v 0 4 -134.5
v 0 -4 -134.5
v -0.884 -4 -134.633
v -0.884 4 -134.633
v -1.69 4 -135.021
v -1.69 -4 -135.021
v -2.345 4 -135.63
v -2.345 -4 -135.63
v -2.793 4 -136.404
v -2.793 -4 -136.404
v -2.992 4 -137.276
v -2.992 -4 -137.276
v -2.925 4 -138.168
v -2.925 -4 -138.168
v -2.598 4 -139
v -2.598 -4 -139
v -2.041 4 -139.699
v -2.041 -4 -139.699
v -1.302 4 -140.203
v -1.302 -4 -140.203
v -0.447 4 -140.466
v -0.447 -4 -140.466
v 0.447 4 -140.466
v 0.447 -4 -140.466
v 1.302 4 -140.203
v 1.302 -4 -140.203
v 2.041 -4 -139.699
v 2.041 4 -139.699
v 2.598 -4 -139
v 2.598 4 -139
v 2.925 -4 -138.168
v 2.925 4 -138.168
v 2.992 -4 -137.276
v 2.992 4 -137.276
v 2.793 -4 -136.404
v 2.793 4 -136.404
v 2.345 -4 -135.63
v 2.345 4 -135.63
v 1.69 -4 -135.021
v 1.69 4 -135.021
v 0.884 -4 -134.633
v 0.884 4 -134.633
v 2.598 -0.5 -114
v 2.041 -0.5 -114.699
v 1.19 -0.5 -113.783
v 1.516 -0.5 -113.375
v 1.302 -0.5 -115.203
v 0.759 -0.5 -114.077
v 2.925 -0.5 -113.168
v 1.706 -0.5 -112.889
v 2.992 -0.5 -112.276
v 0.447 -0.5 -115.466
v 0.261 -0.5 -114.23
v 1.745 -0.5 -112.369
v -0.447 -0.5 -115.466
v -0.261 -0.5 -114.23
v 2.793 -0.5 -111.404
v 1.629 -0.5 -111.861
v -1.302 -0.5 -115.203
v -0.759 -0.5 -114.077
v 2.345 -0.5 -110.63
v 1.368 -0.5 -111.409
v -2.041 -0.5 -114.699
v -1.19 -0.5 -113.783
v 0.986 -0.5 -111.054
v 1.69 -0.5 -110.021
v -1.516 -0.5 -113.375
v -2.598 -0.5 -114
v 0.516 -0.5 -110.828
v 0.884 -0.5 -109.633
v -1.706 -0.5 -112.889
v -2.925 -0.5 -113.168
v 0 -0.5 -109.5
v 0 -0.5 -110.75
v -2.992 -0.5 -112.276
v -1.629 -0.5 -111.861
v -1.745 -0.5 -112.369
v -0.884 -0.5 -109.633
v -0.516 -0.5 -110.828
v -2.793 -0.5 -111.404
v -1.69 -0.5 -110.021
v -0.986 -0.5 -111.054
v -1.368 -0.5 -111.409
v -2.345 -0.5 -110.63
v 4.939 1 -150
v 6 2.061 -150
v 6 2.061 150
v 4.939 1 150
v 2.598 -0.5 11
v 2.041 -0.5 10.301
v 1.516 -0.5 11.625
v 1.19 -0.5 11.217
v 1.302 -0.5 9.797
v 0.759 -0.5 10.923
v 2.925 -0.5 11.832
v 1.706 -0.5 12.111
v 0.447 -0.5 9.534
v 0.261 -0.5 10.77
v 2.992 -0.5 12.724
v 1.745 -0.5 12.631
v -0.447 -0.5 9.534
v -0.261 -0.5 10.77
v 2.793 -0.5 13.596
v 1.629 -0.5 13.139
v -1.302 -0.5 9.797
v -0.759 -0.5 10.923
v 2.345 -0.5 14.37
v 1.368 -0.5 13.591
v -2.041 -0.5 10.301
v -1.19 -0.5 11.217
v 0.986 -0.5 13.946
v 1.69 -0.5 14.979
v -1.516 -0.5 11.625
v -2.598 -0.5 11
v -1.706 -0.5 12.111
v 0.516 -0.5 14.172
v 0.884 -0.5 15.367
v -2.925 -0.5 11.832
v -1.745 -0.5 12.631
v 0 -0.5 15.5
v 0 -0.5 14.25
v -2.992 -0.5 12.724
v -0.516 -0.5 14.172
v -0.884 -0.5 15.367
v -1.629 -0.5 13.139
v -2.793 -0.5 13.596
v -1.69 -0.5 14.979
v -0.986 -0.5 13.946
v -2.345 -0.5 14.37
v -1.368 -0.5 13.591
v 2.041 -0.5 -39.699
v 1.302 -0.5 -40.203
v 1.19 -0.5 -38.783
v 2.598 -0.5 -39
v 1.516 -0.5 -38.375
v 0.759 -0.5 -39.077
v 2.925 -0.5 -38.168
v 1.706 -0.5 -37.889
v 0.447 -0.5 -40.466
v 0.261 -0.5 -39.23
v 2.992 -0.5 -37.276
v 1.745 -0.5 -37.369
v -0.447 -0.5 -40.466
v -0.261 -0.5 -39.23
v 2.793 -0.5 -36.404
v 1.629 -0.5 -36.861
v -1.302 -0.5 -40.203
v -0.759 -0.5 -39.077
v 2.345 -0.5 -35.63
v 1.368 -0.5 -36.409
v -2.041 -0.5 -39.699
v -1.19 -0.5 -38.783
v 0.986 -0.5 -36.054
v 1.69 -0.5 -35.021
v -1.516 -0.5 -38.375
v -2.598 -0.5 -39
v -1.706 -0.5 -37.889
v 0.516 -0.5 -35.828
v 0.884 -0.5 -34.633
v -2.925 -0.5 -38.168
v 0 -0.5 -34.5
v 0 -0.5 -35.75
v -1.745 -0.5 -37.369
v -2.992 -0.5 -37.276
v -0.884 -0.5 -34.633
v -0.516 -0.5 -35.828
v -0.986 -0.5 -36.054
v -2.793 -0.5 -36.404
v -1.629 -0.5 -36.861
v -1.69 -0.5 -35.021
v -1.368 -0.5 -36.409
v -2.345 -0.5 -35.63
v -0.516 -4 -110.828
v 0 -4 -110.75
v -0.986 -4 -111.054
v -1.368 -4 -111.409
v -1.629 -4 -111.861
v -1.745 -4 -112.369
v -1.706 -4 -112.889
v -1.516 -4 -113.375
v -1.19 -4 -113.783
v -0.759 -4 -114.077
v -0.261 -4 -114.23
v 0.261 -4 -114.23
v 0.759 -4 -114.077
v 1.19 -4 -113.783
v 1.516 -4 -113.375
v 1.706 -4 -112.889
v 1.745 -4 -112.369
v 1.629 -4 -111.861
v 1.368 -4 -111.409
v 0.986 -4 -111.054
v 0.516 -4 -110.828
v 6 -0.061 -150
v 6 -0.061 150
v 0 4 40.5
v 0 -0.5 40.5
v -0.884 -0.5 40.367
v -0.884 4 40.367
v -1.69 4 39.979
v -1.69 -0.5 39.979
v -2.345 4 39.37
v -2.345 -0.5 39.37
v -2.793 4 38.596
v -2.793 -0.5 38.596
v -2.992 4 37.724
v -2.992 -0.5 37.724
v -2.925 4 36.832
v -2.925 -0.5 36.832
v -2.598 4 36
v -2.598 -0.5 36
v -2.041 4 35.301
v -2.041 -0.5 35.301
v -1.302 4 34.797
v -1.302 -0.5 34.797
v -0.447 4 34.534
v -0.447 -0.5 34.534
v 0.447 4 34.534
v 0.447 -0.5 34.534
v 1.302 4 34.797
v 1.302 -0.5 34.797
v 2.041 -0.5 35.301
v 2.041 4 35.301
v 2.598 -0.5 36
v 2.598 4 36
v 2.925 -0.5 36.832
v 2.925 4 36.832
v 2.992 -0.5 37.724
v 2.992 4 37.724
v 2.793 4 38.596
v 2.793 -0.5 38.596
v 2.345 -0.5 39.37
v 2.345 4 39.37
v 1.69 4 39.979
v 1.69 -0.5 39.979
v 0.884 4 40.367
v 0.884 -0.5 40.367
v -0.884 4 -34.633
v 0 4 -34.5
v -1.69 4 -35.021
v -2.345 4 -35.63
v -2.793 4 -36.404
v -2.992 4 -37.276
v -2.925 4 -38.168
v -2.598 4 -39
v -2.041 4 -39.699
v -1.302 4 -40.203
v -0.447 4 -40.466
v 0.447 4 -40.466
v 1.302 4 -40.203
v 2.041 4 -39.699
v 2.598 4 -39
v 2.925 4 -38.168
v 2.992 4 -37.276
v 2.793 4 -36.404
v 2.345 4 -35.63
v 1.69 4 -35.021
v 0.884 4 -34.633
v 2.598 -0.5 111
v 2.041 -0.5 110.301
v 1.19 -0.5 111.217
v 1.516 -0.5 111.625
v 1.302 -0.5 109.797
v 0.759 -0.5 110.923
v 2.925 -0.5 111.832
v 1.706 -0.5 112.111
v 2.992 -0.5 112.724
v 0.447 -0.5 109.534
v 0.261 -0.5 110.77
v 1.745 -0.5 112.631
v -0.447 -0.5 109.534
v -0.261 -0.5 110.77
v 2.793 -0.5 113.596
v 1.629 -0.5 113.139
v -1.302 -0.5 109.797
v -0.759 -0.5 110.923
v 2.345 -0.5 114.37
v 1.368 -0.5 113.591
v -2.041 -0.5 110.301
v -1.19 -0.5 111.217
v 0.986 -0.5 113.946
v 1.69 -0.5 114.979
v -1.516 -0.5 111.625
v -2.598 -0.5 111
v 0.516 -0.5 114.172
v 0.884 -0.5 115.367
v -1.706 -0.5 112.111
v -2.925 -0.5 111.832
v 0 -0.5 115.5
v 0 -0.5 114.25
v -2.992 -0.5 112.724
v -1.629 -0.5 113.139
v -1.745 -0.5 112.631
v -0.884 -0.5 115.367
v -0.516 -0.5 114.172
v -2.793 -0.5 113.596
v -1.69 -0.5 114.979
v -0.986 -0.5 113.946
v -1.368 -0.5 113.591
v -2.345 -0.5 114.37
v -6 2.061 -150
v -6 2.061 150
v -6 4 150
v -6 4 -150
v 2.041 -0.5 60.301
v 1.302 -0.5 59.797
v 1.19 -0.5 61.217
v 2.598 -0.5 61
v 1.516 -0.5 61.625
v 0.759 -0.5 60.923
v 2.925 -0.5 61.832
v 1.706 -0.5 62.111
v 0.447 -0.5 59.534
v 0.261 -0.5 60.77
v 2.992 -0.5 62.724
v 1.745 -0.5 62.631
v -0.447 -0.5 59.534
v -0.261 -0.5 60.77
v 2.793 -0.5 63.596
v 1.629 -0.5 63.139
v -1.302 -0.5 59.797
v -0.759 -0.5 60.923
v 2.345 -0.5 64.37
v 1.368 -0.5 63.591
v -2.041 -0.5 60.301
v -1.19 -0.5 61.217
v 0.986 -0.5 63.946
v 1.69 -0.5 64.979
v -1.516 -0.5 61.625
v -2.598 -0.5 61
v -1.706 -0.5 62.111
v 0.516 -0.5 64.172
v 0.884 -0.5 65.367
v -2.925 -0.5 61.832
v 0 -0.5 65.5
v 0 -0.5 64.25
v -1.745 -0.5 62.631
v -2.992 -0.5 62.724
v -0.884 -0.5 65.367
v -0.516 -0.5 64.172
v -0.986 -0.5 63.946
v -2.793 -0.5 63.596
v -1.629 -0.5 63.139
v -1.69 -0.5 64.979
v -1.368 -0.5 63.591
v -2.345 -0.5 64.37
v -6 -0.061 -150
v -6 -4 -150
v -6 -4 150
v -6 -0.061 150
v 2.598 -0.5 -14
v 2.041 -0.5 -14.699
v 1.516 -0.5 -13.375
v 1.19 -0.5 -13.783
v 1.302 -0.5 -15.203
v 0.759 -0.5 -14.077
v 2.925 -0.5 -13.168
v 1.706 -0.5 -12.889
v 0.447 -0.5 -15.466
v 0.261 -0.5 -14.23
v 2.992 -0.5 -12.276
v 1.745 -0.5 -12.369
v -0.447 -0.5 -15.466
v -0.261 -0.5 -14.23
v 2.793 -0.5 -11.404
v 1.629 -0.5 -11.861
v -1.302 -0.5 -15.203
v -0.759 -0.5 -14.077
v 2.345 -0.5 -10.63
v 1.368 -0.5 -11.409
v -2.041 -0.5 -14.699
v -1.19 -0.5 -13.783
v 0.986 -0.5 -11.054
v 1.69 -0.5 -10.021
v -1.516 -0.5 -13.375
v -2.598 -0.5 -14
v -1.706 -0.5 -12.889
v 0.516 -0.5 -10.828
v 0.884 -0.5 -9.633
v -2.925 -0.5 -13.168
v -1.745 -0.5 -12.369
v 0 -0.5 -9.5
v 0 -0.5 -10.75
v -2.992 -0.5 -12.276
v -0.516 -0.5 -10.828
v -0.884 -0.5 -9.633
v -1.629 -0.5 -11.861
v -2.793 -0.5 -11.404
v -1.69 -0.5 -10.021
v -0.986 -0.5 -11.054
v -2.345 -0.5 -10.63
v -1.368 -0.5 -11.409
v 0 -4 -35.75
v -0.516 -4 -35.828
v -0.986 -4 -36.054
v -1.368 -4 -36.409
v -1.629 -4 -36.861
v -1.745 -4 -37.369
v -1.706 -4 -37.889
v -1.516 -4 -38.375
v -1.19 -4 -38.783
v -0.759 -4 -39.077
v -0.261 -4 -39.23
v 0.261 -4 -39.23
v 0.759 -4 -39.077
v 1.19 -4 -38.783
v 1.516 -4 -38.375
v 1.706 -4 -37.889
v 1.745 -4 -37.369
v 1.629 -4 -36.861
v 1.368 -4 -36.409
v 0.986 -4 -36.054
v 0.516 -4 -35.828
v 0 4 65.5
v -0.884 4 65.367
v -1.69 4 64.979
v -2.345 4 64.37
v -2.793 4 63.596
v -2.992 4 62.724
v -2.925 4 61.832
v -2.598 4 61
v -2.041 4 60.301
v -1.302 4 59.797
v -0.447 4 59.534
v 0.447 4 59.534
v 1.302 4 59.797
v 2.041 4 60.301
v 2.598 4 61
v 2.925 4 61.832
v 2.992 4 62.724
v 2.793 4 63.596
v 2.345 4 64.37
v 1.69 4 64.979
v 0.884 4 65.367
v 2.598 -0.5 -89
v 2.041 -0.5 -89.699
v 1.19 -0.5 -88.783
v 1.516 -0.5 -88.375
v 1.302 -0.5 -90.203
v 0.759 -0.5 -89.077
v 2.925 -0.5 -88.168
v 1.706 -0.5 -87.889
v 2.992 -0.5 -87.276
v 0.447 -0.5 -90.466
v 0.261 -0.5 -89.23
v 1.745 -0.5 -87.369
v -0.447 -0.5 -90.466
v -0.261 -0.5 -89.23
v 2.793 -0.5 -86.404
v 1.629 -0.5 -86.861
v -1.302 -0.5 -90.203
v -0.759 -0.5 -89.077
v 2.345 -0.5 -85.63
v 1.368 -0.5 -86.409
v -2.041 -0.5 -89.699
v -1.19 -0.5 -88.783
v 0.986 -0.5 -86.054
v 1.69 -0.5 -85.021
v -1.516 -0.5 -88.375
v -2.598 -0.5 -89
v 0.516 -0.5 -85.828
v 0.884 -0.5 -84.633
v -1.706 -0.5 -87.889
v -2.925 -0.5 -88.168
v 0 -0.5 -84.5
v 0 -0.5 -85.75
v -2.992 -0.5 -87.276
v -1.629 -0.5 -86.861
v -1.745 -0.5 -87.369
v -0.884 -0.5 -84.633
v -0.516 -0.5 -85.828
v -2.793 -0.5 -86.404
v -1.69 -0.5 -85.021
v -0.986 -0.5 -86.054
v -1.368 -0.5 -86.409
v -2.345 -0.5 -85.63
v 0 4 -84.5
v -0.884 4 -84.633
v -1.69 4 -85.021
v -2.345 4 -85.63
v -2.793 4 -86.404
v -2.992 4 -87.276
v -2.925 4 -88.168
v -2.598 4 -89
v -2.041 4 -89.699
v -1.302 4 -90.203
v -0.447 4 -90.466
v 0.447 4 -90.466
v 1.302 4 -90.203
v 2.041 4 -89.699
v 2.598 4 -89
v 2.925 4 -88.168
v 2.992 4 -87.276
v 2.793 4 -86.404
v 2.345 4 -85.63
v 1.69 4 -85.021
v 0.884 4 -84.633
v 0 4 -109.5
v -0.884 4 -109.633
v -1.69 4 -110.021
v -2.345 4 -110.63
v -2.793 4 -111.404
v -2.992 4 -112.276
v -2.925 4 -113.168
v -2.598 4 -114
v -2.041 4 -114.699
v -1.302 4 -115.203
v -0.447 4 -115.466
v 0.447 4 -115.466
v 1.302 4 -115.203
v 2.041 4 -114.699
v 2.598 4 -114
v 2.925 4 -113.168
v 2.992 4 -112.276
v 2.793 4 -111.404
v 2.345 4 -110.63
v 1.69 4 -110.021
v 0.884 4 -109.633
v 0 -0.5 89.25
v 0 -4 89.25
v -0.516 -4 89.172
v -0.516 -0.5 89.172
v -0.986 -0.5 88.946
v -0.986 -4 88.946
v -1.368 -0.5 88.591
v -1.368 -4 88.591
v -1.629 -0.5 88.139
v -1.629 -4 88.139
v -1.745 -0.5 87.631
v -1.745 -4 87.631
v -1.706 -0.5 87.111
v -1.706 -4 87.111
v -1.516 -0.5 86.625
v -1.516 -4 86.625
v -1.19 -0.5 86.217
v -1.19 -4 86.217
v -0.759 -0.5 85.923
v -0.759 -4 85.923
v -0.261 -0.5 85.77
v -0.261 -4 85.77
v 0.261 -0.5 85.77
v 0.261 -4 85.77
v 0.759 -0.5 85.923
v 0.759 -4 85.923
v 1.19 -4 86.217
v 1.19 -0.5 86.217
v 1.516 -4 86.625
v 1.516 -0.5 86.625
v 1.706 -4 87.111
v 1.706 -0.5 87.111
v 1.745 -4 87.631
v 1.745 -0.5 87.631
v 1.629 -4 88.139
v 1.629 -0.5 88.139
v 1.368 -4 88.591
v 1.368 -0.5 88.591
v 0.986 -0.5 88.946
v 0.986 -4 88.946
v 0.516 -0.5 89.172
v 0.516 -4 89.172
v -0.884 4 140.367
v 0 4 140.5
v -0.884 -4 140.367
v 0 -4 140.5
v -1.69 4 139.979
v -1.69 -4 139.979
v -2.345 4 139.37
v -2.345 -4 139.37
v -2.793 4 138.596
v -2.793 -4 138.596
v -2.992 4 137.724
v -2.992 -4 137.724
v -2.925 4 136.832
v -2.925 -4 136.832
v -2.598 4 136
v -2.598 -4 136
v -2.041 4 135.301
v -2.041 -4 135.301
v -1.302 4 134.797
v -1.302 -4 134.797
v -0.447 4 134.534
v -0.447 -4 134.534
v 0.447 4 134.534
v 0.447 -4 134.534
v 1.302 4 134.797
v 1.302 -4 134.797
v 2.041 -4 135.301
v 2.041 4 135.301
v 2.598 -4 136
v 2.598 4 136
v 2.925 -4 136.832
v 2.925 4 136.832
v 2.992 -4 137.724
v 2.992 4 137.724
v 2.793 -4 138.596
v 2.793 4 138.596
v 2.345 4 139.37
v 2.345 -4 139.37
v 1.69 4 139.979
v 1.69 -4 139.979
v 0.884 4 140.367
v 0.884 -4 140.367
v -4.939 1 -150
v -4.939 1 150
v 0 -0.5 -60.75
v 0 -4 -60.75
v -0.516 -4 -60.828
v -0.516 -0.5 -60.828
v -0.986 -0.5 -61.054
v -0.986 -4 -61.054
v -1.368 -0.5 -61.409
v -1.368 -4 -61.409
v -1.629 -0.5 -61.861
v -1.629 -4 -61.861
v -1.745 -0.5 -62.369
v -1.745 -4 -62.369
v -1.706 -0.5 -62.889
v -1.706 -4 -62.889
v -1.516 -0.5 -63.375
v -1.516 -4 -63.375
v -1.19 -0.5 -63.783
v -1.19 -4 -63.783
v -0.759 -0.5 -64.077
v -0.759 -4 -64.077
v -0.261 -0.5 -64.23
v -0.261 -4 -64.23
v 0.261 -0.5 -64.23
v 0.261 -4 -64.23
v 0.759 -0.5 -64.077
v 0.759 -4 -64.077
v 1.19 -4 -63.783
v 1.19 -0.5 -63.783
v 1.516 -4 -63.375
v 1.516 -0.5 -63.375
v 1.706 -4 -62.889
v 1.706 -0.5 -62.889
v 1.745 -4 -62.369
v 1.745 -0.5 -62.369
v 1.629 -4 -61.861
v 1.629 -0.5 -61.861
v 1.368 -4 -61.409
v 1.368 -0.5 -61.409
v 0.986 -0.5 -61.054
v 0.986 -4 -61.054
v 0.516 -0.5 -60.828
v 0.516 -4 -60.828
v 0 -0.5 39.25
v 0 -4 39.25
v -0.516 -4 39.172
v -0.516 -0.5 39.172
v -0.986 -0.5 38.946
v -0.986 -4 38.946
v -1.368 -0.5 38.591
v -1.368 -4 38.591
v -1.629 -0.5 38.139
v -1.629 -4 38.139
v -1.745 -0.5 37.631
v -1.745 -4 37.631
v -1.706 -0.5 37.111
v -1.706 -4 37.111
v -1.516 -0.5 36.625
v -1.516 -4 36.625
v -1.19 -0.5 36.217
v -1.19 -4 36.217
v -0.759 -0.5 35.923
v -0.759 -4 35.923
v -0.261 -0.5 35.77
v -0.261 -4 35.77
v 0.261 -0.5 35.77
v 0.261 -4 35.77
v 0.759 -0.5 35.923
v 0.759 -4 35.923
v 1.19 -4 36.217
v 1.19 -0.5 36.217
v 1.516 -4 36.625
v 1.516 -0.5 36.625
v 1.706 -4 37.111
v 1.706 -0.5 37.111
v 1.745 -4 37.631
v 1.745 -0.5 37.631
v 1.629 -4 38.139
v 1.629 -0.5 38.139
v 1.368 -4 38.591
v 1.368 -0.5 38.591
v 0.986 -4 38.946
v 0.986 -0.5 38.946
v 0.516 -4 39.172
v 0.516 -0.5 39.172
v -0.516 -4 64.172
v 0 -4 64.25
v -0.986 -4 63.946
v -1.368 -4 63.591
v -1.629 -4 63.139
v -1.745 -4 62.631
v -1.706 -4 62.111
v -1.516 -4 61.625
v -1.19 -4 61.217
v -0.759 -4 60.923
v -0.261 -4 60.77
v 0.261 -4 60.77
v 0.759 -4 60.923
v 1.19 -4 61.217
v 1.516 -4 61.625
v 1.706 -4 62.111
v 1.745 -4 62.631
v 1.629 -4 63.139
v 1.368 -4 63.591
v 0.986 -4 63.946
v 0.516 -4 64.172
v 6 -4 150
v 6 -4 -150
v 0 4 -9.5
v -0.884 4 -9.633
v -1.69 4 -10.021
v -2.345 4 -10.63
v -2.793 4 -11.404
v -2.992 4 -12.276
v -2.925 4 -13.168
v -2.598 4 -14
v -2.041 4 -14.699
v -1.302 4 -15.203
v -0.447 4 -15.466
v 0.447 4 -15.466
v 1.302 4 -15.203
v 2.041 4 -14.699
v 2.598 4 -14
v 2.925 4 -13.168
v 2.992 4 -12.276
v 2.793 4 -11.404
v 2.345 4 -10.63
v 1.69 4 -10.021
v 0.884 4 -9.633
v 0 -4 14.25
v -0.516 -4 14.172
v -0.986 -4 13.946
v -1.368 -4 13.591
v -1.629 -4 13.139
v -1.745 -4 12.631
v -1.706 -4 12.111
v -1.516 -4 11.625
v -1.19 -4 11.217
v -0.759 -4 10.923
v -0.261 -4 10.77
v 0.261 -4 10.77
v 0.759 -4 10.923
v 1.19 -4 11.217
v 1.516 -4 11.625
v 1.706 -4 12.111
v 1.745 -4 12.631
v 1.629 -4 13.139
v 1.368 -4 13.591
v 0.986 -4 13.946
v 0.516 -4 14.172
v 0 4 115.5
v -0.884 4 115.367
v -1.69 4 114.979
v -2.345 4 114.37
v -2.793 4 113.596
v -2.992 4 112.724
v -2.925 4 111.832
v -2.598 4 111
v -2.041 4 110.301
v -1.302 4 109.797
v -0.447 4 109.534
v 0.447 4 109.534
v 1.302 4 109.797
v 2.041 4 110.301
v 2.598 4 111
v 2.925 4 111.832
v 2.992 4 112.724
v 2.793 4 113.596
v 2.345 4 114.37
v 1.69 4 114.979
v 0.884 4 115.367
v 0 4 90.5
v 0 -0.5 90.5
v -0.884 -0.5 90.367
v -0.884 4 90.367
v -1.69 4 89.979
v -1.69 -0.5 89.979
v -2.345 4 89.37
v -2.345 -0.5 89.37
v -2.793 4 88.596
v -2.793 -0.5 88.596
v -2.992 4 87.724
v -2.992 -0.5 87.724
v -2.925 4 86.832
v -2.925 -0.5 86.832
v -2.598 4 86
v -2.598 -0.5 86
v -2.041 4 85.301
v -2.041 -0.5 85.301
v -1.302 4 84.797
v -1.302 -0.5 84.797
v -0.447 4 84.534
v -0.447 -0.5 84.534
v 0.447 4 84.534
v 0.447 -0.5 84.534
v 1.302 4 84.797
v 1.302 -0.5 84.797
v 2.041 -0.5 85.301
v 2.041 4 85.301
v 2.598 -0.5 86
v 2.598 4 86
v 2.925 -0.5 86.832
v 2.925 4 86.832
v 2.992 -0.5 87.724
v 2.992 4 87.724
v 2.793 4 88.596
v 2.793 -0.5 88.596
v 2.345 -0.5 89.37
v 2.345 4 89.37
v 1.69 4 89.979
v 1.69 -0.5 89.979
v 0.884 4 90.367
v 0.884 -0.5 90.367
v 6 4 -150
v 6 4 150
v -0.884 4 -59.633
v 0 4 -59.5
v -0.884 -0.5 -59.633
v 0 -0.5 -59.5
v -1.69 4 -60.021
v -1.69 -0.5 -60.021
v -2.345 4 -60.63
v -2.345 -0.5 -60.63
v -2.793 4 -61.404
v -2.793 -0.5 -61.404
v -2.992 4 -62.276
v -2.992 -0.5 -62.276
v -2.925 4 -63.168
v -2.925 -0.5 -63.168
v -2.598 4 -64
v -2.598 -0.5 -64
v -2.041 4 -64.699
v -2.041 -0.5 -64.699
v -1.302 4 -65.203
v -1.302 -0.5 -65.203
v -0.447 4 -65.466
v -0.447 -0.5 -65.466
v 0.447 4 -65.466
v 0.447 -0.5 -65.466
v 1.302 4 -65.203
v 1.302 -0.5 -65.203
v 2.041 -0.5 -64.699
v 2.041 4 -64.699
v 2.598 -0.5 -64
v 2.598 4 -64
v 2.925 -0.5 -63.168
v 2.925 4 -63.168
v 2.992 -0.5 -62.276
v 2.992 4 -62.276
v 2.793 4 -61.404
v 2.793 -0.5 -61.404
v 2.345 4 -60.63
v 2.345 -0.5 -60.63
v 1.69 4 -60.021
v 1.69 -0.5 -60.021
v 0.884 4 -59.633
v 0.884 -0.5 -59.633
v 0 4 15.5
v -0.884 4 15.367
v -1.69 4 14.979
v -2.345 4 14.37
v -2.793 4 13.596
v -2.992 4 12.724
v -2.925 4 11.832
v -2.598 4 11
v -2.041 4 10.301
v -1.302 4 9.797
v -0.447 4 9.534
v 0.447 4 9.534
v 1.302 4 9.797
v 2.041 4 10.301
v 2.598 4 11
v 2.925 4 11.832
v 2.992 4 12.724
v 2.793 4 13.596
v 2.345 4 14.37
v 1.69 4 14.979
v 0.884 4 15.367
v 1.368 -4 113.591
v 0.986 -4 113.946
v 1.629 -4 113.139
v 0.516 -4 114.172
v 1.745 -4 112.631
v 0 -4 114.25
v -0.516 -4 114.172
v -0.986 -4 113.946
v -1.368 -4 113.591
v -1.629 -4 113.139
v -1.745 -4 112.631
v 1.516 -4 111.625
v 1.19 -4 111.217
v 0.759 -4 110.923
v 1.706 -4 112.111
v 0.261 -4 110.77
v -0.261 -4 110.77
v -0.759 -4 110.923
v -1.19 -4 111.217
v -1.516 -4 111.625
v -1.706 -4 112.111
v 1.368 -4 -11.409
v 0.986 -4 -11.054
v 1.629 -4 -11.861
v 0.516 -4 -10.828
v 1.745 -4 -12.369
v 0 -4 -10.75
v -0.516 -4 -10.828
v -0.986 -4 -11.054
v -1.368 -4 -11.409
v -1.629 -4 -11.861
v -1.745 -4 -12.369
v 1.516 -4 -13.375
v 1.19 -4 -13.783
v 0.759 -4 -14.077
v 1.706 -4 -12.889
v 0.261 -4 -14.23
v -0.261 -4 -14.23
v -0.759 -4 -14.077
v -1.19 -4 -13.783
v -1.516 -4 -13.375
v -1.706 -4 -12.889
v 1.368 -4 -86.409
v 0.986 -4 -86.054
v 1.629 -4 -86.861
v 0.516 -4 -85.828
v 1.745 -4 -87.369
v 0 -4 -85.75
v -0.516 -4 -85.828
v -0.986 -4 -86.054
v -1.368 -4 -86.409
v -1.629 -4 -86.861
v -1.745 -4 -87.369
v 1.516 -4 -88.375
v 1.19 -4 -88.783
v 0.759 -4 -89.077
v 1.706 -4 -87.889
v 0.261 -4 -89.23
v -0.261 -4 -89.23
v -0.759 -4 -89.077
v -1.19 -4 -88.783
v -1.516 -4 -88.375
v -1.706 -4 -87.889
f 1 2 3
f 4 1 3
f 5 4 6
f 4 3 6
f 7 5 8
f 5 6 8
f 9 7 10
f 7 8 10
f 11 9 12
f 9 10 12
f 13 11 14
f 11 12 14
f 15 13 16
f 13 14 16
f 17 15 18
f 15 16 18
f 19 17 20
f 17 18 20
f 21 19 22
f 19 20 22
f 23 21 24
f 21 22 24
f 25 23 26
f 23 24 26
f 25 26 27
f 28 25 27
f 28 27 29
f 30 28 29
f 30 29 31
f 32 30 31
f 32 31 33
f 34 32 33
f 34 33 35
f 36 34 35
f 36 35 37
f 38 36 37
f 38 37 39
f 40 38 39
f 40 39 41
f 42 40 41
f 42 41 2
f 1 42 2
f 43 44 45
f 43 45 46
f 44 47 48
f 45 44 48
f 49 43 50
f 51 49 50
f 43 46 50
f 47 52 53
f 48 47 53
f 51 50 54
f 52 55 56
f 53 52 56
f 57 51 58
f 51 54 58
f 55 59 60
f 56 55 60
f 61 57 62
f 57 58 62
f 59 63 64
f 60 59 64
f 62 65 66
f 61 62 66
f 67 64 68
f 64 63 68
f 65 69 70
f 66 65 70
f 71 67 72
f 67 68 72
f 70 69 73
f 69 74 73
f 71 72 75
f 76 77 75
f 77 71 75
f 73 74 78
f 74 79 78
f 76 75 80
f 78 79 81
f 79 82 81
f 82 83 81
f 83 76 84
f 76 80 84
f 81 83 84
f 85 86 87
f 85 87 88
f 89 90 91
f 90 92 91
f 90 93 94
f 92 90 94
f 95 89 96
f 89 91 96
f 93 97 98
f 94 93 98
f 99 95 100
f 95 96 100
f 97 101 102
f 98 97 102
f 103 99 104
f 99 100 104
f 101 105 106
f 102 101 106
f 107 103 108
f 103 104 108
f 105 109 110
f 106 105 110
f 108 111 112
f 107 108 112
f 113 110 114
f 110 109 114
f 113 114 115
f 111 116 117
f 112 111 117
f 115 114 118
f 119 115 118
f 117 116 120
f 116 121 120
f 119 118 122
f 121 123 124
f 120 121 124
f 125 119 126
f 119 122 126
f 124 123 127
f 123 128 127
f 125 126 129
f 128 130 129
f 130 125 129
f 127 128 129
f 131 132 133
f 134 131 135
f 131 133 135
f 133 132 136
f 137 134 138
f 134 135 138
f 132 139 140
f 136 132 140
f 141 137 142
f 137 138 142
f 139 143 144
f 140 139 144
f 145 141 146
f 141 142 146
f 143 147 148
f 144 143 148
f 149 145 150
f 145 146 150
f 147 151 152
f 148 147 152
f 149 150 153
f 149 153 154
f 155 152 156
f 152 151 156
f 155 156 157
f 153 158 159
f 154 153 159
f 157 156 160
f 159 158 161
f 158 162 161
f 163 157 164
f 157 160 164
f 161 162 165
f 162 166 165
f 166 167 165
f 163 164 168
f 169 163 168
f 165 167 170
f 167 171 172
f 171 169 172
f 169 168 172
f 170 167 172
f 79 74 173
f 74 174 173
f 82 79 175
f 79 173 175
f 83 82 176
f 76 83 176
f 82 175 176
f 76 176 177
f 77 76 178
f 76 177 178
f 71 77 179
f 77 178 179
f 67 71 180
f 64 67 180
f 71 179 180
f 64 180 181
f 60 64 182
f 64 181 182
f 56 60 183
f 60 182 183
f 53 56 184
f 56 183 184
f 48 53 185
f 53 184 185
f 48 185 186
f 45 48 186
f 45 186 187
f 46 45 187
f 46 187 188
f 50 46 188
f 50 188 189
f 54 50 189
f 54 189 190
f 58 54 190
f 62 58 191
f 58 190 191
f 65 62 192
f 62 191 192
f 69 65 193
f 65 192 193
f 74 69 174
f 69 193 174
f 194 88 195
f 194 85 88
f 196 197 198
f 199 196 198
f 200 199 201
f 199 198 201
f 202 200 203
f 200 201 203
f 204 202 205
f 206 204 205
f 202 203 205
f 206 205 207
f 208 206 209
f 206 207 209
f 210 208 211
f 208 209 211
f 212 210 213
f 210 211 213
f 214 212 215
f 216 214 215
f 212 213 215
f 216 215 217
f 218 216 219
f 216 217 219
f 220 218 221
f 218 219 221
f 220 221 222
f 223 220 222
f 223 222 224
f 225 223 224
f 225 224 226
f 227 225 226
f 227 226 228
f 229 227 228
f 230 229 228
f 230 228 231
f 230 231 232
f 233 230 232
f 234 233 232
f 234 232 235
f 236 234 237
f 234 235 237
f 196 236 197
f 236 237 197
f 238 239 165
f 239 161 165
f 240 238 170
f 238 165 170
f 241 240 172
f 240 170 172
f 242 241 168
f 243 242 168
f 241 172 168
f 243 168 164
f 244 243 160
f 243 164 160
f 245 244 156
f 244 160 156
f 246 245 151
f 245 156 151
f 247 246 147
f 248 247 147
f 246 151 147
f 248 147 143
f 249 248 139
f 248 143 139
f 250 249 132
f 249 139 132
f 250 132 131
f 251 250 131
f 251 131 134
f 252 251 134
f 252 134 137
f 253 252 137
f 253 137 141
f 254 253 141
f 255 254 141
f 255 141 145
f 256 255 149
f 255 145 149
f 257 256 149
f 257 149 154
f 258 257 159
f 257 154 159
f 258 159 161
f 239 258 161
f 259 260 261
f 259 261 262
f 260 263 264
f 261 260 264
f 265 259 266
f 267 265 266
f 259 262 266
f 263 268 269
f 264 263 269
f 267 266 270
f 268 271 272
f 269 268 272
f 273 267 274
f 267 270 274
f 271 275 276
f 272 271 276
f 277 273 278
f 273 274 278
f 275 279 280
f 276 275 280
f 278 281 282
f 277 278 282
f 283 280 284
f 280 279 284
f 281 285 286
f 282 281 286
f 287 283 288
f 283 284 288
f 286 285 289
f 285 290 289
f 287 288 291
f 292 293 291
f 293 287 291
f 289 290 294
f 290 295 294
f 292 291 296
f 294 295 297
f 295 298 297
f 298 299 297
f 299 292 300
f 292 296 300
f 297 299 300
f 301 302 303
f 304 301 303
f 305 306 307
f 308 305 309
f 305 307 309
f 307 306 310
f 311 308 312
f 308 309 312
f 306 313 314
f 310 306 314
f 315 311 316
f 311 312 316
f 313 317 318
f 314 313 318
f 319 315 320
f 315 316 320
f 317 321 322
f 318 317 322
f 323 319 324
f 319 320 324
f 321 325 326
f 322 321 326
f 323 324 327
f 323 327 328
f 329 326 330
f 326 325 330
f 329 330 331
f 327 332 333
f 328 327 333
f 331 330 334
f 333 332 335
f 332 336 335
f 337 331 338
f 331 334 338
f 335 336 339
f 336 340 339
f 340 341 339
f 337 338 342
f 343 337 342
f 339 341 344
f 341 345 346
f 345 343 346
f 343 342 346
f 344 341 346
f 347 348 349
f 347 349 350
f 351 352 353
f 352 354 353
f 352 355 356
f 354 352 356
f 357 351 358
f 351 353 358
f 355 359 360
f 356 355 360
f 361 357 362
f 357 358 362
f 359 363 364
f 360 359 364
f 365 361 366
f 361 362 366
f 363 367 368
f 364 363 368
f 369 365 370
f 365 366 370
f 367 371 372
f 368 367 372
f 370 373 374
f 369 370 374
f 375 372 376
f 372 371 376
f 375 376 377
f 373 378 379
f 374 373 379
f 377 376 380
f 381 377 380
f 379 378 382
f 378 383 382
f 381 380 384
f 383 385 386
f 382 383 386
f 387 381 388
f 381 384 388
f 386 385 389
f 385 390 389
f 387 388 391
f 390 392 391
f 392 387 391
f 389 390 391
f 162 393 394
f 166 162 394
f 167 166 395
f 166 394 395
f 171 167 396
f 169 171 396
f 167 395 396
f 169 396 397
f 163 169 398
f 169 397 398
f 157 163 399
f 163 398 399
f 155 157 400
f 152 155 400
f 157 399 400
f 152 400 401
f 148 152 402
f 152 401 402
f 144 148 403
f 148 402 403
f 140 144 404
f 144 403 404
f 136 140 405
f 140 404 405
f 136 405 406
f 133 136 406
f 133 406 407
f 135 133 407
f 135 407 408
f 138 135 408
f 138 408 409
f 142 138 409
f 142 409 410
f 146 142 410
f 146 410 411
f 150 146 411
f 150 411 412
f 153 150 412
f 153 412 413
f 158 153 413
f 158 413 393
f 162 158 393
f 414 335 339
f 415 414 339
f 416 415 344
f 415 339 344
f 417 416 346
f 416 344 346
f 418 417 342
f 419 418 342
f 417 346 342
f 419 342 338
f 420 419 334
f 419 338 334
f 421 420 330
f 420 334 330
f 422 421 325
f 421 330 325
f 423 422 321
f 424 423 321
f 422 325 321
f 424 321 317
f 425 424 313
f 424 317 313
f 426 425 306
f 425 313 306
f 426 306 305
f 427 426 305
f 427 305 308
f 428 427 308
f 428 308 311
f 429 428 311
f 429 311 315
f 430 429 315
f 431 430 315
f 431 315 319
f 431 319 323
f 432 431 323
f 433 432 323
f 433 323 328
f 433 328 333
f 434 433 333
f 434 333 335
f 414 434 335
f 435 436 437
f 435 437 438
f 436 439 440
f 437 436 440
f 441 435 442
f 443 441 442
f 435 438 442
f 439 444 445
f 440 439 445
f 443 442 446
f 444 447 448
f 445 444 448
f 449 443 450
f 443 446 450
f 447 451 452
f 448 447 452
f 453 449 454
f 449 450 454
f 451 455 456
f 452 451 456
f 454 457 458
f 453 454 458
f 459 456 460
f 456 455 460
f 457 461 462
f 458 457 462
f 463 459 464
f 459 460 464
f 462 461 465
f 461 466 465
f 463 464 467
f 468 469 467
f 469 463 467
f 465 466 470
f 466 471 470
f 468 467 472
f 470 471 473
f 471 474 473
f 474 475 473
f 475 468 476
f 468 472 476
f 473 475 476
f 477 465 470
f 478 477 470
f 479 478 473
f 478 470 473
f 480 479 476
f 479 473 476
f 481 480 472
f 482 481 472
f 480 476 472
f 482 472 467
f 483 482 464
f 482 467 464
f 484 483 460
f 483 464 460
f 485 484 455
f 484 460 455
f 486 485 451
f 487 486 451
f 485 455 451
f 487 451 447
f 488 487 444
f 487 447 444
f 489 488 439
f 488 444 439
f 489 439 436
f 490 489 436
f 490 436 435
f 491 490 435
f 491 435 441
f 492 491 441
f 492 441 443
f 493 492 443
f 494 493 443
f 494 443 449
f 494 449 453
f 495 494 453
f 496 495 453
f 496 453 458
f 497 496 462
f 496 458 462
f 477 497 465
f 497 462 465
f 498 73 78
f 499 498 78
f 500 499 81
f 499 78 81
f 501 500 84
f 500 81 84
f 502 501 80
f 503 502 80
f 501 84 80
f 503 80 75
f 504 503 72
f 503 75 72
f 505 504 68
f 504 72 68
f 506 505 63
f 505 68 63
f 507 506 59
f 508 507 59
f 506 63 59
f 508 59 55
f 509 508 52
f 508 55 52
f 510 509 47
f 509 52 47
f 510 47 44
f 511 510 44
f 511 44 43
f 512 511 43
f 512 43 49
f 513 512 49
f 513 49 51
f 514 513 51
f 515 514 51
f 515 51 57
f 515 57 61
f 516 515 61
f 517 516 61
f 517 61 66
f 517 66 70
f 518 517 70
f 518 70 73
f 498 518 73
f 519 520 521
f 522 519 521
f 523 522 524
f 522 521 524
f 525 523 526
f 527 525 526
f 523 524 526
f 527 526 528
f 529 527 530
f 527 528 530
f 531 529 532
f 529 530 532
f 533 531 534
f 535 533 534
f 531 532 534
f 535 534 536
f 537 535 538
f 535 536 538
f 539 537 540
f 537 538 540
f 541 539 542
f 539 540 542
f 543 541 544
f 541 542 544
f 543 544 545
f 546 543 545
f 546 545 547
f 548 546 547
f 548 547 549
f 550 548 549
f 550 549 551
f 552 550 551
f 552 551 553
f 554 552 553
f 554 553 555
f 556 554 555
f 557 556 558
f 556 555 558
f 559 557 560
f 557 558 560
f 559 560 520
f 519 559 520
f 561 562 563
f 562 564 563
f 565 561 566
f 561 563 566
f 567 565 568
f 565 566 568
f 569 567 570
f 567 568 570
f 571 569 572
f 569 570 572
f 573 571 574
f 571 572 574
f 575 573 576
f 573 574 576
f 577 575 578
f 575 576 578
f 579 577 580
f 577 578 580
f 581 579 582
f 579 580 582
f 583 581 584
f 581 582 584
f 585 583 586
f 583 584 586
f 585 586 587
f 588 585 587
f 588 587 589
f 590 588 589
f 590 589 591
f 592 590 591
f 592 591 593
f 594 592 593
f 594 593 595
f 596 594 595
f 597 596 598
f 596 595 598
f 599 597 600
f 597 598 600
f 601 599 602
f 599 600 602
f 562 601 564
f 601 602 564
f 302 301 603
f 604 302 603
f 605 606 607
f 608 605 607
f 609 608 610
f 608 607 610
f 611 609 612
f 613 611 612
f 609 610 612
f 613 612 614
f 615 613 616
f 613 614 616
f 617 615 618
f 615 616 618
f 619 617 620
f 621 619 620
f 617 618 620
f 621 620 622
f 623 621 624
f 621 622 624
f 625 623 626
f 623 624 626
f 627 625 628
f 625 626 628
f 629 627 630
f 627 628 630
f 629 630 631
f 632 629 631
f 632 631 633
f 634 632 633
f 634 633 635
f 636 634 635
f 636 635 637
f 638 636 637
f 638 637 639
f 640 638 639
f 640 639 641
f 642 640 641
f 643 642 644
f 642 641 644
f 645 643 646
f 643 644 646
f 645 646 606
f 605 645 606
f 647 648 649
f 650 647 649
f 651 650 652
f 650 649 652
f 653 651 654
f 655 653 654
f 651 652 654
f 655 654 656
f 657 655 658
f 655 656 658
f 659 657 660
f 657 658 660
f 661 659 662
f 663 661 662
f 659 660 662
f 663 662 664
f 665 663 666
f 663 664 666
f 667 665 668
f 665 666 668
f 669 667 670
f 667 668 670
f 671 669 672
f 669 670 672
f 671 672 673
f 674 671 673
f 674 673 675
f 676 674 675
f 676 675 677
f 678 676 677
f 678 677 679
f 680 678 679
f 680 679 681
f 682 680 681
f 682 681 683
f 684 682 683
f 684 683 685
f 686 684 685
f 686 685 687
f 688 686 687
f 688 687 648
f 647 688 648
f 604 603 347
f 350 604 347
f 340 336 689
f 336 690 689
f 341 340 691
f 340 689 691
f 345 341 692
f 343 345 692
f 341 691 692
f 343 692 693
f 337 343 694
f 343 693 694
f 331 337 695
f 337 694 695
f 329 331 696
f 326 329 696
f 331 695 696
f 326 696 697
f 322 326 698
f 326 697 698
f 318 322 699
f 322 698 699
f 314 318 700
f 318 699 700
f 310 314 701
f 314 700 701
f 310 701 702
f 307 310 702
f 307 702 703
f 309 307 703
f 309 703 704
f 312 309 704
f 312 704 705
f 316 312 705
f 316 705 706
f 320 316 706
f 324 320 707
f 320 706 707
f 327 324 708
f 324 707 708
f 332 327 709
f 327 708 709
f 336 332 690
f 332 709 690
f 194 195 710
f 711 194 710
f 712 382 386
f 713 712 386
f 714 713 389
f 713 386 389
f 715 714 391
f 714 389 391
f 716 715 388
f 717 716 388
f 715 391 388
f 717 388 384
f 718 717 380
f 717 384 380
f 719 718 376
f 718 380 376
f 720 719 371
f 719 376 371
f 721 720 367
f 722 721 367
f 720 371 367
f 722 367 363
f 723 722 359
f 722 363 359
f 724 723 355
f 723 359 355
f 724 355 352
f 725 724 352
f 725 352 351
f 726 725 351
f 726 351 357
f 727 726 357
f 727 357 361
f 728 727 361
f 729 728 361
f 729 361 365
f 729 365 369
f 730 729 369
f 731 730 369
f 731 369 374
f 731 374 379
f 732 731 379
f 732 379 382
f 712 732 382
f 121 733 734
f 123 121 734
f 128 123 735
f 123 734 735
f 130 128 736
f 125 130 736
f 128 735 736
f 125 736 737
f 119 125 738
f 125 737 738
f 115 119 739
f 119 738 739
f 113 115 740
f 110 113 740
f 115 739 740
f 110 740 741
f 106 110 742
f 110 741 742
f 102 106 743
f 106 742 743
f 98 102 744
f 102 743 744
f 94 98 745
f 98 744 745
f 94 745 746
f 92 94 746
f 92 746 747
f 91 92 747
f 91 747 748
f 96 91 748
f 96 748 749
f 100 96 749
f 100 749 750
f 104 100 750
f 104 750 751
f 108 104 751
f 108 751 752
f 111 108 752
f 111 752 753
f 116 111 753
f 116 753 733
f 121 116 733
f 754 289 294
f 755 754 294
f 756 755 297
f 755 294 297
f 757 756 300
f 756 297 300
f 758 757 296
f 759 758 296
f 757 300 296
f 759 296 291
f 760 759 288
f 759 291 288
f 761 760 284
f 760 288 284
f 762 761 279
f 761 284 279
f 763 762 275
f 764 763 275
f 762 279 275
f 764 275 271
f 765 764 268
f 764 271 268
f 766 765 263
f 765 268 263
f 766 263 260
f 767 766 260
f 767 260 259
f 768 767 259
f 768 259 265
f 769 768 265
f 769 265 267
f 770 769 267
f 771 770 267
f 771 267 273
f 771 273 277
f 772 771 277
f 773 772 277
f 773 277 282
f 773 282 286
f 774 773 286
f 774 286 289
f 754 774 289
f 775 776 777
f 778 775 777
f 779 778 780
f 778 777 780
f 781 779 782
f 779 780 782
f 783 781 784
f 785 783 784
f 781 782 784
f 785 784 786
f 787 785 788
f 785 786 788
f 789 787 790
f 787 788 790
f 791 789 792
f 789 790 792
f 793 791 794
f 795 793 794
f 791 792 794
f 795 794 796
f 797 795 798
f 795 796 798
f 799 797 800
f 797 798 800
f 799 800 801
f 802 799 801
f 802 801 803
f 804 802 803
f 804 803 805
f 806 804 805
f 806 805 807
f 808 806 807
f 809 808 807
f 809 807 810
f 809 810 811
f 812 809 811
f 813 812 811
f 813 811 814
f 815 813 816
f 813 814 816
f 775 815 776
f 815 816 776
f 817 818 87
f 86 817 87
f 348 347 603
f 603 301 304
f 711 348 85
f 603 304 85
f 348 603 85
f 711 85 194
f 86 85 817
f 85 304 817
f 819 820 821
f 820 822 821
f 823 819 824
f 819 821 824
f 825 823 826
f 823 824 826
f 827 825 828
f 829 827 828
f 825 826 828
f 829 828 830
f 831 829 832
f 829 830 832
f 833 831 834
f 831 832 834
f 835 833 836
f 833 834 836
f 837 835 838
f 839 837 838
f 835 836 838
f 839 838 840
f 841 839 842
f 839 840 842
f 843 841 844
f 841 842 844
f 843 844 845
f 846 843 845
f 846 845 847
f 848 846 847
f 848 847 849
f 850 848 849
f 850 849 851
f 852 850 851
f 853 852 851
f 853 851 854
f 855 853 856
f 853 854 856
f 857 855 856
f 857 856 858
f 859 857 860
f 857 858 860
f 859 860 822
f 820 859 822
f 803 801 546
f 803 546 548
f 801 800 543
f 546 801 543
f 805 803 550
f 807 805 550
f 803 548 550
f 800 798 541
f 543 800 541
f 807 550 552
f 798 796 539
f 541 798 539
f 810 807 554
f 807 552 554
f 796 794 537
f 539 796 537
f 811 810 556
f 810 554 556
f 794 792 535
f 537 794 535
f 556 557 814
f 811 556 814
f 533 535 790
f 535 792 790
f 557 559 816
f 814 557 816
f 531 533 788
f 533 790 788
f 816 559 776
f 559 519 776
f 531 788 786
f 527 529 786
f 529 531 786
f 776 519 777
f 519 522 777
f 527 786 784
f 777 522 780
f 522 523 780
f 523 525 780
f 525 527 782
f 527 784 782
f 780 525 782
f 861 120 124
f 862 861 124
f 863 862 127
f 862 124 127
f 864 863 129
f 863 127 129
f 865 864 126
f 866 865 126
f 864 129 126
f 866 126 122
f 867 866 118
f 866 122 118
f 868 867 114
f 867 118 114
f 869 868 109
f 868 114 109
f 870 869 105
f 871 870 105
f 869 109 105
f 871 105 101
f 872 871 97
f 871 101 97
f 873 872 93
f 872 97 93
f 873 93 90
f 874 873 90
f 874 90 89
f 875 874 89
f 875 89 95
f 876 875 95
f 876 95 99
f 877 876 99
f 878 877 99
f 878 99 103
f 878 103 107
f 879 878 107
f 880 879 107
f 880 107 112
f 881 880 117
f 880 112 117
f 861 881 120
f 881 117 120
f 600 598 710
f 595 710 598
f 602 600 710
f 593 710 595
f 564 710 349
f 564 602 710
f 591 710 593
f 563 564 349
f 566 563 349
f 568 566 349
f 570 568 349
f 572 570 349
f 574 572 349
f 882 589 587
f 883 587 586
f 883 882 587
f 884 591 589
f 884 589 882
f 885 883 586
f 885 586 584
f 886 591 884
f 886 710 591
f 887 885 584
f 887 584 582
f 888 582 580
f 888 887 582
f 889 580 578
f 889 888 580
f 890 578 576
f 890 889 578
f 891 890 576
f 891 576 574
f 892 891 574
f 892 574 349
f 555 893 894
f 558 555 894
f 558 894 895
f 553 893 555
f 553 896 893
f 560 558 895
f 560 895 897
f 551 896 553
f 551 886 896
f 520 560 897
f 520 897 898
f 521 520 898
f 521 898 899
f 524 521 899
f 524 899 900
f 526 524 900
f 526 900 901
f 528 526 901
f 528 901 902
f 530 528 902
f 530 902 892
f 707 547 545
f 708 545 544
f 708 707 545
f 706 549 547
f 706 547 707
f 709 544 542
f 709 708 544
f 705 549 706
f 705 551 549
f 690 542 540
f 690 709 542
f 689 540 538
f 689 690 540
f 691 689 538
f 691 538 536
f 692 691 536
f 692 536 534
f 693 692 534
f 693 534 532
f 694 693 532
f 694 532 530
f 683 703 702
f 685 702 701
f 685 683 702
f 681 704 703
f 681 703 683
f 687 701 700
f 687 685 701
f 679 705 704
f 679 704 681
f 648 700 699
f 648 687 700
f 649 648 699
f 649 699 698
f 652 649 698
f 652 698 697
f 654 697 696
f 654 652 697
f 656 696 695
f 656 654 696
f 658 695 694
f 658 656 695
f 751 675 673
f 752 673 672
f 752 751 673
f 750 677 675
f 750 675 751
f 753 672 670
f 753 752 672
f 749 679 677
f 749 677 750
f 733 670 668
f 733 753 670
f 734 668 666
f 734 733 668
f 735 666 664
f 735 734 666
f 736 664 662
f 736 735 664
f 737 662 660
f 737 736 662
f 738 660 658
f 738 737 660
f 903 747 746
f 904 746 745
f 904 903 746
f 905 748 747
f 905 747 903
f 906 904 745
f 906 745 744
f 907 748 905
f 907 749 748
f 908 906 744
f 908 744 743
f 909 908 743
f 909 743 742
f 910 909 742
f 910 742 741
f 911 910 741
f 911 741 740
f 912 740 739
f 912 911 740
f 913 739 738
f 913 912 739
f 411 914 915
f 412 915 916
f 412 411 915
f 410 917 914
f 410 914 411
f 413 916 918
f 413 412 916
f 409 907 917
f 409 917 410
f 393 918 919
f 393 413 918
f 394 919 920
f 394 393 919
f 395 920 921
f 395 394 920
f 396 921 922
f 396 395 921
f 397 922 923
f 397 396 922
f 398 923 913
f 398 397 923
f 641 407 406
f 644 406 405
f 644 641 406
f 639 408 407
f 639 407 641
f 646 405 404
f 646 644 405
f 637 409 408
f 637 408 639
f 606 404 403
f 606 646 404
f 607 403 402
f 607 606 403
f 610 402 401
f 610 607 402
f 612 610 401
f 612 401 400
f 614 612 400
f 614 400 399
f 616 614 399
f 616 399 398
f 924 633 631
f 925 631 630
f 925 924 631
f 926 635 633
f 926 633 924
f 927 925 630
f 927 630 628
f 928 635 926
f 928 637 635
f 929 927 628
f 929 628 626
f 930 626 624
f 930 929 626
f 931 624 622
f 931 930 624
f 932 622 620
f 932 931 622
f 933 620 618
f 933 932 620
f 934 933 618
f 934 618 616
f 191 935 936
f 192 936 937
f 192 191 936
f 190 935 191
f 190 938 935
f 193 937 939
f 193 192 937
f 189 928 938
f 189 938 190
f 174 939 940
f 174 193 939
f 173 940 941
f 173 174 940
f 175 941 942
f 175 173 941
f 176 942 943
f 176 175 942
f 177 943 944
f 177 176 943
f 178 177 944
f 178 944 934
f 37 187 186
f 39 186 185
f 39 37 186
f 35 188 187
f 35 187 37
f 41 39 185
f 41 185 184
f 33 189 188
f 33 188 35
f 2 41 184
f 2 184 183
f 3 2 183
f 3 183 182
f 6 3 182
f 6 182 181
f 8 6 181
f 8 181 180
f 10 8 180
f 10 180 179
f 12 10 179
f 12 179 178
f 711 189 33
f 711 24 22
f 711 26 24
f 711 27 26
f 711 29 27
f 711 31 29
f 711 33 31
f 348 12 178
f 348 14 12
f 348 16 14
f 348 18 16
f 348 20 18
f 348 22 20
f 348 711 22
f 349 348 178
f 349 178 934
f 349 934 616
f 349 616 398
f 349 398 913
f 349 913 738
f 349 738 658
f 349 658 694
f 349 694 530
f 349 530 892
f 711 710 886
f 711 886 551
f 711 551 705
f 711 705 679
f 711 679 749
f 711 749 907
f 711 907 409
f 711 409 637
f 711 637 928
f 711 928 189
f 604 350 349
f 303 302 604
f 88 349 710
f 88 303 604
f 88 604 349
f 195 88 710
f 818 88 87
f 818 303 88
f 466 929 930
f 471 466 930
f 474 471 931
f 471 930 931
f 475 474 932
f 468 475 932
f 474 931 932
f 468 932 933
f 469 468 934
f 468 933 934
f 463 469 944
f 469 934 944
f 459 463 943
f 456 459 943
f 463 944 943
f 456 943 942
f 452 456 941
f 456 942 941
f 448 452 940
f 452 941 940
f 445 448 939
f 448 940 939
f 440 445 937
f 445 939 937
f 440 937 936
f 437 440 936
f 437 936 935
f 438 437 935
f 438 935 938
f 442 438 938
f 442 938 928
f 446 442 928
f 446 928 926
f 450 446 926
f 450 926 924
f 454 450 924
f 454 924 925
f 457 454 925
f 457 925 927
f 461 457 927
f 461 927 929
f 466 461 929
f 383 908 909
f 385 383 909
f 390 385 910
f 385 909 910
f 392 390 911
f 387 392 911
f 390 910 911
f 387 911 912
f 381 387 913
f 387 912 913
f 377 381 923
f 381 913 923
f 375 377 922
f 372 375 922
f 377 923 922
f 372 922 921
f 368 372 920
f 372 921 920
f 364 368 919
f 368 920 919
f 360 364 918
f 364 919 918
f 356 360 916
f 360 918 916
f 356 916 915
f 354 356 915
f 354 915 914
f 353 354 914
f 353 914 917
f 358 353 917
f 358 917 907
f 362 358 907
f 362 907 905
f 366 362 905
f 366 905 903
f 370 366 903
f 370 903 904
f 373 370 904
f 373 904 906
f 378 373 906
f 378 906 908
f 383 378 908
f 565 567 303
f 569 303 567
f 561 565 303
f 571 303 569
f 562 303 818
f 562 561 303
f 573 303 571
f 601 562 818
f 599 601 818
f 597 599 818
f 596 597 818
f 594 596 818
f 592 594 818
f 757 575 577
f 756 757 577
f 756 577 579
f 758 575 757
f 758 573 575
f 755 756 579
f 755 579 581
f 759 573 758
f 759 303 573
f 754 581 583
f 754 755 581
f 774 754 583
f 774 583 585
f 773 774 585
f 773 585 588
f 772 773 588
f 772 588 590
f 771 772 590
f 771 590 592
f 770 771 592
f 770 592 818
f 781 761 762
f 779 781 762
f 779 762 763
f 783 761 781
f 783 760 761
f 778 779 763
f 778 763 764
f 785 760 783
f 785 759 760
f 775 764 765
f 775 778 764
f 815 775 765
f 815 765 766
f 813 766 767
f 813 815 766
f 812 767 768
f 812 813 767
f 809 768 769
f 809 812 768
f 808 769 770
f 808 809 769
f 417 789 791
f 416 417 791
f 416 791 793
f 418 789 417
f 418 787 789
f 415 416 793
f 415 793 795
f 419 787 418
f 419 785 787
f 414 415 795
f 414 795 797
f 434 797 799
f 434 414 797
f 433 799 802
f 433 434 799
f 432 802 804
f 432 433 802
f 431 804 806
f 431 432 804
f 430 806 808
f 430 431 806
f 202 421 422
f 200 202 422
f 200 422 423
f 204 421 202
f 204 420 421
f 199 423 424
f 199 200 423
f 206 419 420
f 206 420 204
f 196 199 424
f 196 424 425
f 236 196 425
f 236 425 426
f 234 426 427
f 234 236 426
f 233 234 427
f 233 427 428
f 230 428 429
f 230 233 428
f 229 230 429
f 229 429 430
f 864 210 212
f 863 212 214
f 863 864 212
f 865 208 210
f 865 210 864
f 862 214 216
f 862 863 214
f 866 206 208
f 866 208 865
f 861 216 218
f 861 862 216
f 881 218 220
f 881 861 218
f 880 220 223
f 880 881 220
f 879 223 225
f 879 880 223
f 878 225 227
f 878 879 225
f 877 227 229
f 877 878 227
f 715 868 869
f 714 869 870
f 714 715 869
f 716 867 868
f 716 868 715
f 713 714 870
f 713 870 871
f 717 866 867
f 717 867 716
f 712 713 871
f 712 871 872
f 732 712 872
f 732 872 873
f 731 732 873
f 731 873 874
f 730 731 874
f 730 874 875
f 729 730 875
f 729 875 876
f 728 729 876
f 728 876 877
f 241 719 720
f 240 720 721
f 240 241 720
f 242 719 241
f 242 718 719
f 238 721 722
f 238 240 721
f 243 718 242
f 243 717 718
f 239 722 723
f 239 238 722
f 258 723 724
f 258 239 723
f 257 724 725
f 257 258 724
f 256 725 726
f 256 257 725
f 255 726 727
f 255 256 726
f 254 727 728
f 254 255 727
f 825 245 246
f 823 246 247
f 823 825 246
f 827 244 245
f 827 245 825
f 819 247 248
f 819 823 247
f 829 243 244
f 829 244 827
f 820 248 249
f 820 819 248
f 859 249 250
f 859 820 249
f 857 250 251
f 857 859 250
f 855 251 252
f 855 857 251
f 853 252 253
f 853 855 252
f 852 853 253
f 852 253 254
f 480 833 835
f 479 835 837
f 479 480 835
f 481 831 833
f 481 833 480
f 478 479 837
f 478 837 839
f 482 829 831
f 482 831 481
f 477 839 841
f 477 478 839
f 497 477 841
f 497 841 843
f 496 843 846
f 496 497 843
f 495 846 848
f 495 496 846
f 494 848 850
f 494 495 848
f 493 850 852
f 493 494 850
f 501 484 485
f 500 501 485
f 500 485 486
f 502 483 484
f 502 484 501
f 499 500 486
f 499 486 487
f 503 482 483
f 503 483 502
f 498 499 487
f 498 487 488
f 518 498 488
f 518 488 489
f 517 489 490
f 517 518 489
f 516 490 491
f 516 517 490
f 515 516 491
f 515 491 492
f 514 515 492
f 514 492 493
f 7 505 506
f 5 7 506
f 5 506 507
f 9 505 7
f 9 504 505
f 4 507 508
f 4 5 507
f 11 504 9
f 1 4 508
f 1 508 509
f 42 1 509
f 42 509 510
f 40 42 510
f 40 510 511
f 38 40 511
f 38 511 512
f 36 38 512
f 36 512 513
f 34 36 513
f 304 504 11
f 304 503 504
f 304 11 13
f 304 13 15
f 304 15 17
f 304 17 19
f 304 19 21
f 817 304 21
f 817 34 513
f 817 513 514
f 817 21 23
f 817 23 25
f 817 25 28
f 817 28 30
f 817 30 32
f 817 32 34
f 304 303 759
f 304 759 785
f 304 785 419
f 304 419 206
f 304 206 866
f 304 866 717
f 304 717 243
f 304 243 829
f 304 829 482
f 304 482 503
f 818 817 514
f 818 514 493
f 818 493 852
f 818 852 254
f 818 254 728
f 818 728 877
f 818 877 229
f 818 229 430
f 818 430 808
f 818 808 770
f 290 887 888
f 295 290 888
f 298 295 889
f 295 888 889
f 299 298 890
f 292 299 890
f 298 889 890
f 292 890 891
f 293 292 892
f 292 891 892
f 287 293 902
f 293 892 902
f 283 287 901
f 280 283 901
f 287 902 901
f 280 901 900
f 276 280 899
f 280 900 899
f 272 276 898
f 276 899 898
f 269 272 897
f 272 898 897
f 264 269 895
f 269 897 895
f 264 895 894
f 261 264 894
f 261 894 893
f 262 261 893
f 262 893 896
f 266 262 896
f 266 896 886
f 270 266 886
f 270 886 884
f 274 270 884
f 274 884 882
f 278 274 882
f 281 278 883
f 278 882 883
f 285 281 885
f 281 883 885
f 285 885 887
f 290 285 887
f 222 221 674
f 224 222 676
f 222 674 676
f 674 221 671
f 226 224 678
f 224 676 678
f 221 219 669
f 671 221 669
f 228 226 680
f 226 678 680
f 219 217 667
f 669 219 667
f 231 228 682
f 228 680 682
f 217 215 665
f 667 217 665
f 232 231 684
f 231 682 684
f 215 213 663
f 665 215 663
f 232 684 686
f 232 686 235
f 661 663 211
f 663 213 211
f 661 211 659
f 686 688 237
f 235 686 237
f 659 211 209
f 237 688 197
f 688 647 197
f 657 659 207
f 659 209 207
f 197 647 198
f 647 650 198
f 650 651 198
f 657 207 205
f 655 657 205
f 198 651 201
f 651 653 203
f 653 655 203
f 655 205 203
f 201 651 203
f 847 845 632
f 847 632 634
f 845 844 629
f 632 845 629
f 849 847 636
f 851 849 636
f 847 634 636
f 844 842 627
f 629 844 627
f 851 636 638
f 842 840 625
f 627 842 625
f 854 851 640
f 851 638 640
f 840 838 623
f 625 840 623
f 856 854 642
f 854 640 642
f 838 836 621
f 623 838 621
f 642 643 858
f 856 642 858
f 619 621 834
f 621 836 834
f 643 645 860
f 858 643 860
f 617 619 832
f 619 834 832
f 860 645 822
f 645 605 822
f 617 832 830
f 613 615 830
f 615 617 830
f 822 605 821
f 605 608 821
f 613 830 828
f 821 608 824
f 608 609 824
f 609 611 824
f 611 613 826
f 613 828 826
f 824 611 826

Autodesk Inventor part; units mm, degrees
ref_plane "YZ Plane" through (0, 0, 0) normal (1, 0, 0) x (0, 1, 0)
ref_plane "XZ Plane" through (0, 0, 0) normal (0, 1, 0) x (-1, 0, 0)
ref_plane "XY Plane" through (0, 0, 0) normal (0, 0, 1) x (1, 0, 0)
sketch "Sketch1" plane through (0, 0, 0) normal (0, 0, 1) x (1, 0, 0)
  line L0 (-6, 4) -> (6, 4)
  line L1 (6, 4) -> (6, -4)
  line L2 (6, -4) -> (-6, -4)
  line L3 (-6, -4) -> (-6, 4)
  line L4 (-6, 4) -> (6, -4) construction
  line L5 (6, 4) -> (-6, -4) construction
  line L6 (-6, 2.0607) -> (-4.9393, 1)
  line L7 (-6, 2.0607) -> (-4.5, 2.0607) construction
  line L8 (-4.9393, 1) -> (-6, -0.0607)
  line L9 (0, 4) -> (0, -4) construction
  line L10 (6, 2.0607) -> (4.9393, 1)
  line L11 (4.9393, 1) -> (6, -0.0607)
  point P0 (0, 0)
  point P1 (6, -0.0607)
  point P2 (6, 2.0607)
  dimension "d0" = 12
  dimension "d1" = 8
  dimension "d2" = 45
  dimension "d3" = 3
  dimension "d4" = 1.5
extrude "Extrusion1" add sketch "Sketch1" along normal mid plane 300 contours L0 L1 L10 L11 L2 L3 L8 L6
sketch "Sketch2" plane through (-6, 4, 150) normal (0, 1, 0) x (1, 0, 0)
  point P0 (6, 150)
  point P1 (6, 150)
  point P2 (6, 162.5)
  dimension "d17" = 12.5
hole "Hole1" at (0, 4, -12.5) direction (0, -1, 0) diameter 3.5 end through all counterbore diameter 6 counterbore depth 4.5
pattern_linear "Rectangular Pattern1" count 12 spacing 25 along (0, 0, 1) of "Hole1" first direction both ways yes
sketch "Sketch3" plane through (-6, 4, 150) normal (0, 1, 0) x (1, 0, 0)
  circle A0 centre (6, 12.5) radius 3 projected
  circle A1 centre (6, 287.5) radius 3 projected
  point P0 (6, 150)
hole "Hole2" at (0, 4, 137.5) at (0, 4, -137.5) direction (0, -1, 0) diameter 6 end through all
properties part number "MGN15 Rail" material "Stainless Steel, 440C"
